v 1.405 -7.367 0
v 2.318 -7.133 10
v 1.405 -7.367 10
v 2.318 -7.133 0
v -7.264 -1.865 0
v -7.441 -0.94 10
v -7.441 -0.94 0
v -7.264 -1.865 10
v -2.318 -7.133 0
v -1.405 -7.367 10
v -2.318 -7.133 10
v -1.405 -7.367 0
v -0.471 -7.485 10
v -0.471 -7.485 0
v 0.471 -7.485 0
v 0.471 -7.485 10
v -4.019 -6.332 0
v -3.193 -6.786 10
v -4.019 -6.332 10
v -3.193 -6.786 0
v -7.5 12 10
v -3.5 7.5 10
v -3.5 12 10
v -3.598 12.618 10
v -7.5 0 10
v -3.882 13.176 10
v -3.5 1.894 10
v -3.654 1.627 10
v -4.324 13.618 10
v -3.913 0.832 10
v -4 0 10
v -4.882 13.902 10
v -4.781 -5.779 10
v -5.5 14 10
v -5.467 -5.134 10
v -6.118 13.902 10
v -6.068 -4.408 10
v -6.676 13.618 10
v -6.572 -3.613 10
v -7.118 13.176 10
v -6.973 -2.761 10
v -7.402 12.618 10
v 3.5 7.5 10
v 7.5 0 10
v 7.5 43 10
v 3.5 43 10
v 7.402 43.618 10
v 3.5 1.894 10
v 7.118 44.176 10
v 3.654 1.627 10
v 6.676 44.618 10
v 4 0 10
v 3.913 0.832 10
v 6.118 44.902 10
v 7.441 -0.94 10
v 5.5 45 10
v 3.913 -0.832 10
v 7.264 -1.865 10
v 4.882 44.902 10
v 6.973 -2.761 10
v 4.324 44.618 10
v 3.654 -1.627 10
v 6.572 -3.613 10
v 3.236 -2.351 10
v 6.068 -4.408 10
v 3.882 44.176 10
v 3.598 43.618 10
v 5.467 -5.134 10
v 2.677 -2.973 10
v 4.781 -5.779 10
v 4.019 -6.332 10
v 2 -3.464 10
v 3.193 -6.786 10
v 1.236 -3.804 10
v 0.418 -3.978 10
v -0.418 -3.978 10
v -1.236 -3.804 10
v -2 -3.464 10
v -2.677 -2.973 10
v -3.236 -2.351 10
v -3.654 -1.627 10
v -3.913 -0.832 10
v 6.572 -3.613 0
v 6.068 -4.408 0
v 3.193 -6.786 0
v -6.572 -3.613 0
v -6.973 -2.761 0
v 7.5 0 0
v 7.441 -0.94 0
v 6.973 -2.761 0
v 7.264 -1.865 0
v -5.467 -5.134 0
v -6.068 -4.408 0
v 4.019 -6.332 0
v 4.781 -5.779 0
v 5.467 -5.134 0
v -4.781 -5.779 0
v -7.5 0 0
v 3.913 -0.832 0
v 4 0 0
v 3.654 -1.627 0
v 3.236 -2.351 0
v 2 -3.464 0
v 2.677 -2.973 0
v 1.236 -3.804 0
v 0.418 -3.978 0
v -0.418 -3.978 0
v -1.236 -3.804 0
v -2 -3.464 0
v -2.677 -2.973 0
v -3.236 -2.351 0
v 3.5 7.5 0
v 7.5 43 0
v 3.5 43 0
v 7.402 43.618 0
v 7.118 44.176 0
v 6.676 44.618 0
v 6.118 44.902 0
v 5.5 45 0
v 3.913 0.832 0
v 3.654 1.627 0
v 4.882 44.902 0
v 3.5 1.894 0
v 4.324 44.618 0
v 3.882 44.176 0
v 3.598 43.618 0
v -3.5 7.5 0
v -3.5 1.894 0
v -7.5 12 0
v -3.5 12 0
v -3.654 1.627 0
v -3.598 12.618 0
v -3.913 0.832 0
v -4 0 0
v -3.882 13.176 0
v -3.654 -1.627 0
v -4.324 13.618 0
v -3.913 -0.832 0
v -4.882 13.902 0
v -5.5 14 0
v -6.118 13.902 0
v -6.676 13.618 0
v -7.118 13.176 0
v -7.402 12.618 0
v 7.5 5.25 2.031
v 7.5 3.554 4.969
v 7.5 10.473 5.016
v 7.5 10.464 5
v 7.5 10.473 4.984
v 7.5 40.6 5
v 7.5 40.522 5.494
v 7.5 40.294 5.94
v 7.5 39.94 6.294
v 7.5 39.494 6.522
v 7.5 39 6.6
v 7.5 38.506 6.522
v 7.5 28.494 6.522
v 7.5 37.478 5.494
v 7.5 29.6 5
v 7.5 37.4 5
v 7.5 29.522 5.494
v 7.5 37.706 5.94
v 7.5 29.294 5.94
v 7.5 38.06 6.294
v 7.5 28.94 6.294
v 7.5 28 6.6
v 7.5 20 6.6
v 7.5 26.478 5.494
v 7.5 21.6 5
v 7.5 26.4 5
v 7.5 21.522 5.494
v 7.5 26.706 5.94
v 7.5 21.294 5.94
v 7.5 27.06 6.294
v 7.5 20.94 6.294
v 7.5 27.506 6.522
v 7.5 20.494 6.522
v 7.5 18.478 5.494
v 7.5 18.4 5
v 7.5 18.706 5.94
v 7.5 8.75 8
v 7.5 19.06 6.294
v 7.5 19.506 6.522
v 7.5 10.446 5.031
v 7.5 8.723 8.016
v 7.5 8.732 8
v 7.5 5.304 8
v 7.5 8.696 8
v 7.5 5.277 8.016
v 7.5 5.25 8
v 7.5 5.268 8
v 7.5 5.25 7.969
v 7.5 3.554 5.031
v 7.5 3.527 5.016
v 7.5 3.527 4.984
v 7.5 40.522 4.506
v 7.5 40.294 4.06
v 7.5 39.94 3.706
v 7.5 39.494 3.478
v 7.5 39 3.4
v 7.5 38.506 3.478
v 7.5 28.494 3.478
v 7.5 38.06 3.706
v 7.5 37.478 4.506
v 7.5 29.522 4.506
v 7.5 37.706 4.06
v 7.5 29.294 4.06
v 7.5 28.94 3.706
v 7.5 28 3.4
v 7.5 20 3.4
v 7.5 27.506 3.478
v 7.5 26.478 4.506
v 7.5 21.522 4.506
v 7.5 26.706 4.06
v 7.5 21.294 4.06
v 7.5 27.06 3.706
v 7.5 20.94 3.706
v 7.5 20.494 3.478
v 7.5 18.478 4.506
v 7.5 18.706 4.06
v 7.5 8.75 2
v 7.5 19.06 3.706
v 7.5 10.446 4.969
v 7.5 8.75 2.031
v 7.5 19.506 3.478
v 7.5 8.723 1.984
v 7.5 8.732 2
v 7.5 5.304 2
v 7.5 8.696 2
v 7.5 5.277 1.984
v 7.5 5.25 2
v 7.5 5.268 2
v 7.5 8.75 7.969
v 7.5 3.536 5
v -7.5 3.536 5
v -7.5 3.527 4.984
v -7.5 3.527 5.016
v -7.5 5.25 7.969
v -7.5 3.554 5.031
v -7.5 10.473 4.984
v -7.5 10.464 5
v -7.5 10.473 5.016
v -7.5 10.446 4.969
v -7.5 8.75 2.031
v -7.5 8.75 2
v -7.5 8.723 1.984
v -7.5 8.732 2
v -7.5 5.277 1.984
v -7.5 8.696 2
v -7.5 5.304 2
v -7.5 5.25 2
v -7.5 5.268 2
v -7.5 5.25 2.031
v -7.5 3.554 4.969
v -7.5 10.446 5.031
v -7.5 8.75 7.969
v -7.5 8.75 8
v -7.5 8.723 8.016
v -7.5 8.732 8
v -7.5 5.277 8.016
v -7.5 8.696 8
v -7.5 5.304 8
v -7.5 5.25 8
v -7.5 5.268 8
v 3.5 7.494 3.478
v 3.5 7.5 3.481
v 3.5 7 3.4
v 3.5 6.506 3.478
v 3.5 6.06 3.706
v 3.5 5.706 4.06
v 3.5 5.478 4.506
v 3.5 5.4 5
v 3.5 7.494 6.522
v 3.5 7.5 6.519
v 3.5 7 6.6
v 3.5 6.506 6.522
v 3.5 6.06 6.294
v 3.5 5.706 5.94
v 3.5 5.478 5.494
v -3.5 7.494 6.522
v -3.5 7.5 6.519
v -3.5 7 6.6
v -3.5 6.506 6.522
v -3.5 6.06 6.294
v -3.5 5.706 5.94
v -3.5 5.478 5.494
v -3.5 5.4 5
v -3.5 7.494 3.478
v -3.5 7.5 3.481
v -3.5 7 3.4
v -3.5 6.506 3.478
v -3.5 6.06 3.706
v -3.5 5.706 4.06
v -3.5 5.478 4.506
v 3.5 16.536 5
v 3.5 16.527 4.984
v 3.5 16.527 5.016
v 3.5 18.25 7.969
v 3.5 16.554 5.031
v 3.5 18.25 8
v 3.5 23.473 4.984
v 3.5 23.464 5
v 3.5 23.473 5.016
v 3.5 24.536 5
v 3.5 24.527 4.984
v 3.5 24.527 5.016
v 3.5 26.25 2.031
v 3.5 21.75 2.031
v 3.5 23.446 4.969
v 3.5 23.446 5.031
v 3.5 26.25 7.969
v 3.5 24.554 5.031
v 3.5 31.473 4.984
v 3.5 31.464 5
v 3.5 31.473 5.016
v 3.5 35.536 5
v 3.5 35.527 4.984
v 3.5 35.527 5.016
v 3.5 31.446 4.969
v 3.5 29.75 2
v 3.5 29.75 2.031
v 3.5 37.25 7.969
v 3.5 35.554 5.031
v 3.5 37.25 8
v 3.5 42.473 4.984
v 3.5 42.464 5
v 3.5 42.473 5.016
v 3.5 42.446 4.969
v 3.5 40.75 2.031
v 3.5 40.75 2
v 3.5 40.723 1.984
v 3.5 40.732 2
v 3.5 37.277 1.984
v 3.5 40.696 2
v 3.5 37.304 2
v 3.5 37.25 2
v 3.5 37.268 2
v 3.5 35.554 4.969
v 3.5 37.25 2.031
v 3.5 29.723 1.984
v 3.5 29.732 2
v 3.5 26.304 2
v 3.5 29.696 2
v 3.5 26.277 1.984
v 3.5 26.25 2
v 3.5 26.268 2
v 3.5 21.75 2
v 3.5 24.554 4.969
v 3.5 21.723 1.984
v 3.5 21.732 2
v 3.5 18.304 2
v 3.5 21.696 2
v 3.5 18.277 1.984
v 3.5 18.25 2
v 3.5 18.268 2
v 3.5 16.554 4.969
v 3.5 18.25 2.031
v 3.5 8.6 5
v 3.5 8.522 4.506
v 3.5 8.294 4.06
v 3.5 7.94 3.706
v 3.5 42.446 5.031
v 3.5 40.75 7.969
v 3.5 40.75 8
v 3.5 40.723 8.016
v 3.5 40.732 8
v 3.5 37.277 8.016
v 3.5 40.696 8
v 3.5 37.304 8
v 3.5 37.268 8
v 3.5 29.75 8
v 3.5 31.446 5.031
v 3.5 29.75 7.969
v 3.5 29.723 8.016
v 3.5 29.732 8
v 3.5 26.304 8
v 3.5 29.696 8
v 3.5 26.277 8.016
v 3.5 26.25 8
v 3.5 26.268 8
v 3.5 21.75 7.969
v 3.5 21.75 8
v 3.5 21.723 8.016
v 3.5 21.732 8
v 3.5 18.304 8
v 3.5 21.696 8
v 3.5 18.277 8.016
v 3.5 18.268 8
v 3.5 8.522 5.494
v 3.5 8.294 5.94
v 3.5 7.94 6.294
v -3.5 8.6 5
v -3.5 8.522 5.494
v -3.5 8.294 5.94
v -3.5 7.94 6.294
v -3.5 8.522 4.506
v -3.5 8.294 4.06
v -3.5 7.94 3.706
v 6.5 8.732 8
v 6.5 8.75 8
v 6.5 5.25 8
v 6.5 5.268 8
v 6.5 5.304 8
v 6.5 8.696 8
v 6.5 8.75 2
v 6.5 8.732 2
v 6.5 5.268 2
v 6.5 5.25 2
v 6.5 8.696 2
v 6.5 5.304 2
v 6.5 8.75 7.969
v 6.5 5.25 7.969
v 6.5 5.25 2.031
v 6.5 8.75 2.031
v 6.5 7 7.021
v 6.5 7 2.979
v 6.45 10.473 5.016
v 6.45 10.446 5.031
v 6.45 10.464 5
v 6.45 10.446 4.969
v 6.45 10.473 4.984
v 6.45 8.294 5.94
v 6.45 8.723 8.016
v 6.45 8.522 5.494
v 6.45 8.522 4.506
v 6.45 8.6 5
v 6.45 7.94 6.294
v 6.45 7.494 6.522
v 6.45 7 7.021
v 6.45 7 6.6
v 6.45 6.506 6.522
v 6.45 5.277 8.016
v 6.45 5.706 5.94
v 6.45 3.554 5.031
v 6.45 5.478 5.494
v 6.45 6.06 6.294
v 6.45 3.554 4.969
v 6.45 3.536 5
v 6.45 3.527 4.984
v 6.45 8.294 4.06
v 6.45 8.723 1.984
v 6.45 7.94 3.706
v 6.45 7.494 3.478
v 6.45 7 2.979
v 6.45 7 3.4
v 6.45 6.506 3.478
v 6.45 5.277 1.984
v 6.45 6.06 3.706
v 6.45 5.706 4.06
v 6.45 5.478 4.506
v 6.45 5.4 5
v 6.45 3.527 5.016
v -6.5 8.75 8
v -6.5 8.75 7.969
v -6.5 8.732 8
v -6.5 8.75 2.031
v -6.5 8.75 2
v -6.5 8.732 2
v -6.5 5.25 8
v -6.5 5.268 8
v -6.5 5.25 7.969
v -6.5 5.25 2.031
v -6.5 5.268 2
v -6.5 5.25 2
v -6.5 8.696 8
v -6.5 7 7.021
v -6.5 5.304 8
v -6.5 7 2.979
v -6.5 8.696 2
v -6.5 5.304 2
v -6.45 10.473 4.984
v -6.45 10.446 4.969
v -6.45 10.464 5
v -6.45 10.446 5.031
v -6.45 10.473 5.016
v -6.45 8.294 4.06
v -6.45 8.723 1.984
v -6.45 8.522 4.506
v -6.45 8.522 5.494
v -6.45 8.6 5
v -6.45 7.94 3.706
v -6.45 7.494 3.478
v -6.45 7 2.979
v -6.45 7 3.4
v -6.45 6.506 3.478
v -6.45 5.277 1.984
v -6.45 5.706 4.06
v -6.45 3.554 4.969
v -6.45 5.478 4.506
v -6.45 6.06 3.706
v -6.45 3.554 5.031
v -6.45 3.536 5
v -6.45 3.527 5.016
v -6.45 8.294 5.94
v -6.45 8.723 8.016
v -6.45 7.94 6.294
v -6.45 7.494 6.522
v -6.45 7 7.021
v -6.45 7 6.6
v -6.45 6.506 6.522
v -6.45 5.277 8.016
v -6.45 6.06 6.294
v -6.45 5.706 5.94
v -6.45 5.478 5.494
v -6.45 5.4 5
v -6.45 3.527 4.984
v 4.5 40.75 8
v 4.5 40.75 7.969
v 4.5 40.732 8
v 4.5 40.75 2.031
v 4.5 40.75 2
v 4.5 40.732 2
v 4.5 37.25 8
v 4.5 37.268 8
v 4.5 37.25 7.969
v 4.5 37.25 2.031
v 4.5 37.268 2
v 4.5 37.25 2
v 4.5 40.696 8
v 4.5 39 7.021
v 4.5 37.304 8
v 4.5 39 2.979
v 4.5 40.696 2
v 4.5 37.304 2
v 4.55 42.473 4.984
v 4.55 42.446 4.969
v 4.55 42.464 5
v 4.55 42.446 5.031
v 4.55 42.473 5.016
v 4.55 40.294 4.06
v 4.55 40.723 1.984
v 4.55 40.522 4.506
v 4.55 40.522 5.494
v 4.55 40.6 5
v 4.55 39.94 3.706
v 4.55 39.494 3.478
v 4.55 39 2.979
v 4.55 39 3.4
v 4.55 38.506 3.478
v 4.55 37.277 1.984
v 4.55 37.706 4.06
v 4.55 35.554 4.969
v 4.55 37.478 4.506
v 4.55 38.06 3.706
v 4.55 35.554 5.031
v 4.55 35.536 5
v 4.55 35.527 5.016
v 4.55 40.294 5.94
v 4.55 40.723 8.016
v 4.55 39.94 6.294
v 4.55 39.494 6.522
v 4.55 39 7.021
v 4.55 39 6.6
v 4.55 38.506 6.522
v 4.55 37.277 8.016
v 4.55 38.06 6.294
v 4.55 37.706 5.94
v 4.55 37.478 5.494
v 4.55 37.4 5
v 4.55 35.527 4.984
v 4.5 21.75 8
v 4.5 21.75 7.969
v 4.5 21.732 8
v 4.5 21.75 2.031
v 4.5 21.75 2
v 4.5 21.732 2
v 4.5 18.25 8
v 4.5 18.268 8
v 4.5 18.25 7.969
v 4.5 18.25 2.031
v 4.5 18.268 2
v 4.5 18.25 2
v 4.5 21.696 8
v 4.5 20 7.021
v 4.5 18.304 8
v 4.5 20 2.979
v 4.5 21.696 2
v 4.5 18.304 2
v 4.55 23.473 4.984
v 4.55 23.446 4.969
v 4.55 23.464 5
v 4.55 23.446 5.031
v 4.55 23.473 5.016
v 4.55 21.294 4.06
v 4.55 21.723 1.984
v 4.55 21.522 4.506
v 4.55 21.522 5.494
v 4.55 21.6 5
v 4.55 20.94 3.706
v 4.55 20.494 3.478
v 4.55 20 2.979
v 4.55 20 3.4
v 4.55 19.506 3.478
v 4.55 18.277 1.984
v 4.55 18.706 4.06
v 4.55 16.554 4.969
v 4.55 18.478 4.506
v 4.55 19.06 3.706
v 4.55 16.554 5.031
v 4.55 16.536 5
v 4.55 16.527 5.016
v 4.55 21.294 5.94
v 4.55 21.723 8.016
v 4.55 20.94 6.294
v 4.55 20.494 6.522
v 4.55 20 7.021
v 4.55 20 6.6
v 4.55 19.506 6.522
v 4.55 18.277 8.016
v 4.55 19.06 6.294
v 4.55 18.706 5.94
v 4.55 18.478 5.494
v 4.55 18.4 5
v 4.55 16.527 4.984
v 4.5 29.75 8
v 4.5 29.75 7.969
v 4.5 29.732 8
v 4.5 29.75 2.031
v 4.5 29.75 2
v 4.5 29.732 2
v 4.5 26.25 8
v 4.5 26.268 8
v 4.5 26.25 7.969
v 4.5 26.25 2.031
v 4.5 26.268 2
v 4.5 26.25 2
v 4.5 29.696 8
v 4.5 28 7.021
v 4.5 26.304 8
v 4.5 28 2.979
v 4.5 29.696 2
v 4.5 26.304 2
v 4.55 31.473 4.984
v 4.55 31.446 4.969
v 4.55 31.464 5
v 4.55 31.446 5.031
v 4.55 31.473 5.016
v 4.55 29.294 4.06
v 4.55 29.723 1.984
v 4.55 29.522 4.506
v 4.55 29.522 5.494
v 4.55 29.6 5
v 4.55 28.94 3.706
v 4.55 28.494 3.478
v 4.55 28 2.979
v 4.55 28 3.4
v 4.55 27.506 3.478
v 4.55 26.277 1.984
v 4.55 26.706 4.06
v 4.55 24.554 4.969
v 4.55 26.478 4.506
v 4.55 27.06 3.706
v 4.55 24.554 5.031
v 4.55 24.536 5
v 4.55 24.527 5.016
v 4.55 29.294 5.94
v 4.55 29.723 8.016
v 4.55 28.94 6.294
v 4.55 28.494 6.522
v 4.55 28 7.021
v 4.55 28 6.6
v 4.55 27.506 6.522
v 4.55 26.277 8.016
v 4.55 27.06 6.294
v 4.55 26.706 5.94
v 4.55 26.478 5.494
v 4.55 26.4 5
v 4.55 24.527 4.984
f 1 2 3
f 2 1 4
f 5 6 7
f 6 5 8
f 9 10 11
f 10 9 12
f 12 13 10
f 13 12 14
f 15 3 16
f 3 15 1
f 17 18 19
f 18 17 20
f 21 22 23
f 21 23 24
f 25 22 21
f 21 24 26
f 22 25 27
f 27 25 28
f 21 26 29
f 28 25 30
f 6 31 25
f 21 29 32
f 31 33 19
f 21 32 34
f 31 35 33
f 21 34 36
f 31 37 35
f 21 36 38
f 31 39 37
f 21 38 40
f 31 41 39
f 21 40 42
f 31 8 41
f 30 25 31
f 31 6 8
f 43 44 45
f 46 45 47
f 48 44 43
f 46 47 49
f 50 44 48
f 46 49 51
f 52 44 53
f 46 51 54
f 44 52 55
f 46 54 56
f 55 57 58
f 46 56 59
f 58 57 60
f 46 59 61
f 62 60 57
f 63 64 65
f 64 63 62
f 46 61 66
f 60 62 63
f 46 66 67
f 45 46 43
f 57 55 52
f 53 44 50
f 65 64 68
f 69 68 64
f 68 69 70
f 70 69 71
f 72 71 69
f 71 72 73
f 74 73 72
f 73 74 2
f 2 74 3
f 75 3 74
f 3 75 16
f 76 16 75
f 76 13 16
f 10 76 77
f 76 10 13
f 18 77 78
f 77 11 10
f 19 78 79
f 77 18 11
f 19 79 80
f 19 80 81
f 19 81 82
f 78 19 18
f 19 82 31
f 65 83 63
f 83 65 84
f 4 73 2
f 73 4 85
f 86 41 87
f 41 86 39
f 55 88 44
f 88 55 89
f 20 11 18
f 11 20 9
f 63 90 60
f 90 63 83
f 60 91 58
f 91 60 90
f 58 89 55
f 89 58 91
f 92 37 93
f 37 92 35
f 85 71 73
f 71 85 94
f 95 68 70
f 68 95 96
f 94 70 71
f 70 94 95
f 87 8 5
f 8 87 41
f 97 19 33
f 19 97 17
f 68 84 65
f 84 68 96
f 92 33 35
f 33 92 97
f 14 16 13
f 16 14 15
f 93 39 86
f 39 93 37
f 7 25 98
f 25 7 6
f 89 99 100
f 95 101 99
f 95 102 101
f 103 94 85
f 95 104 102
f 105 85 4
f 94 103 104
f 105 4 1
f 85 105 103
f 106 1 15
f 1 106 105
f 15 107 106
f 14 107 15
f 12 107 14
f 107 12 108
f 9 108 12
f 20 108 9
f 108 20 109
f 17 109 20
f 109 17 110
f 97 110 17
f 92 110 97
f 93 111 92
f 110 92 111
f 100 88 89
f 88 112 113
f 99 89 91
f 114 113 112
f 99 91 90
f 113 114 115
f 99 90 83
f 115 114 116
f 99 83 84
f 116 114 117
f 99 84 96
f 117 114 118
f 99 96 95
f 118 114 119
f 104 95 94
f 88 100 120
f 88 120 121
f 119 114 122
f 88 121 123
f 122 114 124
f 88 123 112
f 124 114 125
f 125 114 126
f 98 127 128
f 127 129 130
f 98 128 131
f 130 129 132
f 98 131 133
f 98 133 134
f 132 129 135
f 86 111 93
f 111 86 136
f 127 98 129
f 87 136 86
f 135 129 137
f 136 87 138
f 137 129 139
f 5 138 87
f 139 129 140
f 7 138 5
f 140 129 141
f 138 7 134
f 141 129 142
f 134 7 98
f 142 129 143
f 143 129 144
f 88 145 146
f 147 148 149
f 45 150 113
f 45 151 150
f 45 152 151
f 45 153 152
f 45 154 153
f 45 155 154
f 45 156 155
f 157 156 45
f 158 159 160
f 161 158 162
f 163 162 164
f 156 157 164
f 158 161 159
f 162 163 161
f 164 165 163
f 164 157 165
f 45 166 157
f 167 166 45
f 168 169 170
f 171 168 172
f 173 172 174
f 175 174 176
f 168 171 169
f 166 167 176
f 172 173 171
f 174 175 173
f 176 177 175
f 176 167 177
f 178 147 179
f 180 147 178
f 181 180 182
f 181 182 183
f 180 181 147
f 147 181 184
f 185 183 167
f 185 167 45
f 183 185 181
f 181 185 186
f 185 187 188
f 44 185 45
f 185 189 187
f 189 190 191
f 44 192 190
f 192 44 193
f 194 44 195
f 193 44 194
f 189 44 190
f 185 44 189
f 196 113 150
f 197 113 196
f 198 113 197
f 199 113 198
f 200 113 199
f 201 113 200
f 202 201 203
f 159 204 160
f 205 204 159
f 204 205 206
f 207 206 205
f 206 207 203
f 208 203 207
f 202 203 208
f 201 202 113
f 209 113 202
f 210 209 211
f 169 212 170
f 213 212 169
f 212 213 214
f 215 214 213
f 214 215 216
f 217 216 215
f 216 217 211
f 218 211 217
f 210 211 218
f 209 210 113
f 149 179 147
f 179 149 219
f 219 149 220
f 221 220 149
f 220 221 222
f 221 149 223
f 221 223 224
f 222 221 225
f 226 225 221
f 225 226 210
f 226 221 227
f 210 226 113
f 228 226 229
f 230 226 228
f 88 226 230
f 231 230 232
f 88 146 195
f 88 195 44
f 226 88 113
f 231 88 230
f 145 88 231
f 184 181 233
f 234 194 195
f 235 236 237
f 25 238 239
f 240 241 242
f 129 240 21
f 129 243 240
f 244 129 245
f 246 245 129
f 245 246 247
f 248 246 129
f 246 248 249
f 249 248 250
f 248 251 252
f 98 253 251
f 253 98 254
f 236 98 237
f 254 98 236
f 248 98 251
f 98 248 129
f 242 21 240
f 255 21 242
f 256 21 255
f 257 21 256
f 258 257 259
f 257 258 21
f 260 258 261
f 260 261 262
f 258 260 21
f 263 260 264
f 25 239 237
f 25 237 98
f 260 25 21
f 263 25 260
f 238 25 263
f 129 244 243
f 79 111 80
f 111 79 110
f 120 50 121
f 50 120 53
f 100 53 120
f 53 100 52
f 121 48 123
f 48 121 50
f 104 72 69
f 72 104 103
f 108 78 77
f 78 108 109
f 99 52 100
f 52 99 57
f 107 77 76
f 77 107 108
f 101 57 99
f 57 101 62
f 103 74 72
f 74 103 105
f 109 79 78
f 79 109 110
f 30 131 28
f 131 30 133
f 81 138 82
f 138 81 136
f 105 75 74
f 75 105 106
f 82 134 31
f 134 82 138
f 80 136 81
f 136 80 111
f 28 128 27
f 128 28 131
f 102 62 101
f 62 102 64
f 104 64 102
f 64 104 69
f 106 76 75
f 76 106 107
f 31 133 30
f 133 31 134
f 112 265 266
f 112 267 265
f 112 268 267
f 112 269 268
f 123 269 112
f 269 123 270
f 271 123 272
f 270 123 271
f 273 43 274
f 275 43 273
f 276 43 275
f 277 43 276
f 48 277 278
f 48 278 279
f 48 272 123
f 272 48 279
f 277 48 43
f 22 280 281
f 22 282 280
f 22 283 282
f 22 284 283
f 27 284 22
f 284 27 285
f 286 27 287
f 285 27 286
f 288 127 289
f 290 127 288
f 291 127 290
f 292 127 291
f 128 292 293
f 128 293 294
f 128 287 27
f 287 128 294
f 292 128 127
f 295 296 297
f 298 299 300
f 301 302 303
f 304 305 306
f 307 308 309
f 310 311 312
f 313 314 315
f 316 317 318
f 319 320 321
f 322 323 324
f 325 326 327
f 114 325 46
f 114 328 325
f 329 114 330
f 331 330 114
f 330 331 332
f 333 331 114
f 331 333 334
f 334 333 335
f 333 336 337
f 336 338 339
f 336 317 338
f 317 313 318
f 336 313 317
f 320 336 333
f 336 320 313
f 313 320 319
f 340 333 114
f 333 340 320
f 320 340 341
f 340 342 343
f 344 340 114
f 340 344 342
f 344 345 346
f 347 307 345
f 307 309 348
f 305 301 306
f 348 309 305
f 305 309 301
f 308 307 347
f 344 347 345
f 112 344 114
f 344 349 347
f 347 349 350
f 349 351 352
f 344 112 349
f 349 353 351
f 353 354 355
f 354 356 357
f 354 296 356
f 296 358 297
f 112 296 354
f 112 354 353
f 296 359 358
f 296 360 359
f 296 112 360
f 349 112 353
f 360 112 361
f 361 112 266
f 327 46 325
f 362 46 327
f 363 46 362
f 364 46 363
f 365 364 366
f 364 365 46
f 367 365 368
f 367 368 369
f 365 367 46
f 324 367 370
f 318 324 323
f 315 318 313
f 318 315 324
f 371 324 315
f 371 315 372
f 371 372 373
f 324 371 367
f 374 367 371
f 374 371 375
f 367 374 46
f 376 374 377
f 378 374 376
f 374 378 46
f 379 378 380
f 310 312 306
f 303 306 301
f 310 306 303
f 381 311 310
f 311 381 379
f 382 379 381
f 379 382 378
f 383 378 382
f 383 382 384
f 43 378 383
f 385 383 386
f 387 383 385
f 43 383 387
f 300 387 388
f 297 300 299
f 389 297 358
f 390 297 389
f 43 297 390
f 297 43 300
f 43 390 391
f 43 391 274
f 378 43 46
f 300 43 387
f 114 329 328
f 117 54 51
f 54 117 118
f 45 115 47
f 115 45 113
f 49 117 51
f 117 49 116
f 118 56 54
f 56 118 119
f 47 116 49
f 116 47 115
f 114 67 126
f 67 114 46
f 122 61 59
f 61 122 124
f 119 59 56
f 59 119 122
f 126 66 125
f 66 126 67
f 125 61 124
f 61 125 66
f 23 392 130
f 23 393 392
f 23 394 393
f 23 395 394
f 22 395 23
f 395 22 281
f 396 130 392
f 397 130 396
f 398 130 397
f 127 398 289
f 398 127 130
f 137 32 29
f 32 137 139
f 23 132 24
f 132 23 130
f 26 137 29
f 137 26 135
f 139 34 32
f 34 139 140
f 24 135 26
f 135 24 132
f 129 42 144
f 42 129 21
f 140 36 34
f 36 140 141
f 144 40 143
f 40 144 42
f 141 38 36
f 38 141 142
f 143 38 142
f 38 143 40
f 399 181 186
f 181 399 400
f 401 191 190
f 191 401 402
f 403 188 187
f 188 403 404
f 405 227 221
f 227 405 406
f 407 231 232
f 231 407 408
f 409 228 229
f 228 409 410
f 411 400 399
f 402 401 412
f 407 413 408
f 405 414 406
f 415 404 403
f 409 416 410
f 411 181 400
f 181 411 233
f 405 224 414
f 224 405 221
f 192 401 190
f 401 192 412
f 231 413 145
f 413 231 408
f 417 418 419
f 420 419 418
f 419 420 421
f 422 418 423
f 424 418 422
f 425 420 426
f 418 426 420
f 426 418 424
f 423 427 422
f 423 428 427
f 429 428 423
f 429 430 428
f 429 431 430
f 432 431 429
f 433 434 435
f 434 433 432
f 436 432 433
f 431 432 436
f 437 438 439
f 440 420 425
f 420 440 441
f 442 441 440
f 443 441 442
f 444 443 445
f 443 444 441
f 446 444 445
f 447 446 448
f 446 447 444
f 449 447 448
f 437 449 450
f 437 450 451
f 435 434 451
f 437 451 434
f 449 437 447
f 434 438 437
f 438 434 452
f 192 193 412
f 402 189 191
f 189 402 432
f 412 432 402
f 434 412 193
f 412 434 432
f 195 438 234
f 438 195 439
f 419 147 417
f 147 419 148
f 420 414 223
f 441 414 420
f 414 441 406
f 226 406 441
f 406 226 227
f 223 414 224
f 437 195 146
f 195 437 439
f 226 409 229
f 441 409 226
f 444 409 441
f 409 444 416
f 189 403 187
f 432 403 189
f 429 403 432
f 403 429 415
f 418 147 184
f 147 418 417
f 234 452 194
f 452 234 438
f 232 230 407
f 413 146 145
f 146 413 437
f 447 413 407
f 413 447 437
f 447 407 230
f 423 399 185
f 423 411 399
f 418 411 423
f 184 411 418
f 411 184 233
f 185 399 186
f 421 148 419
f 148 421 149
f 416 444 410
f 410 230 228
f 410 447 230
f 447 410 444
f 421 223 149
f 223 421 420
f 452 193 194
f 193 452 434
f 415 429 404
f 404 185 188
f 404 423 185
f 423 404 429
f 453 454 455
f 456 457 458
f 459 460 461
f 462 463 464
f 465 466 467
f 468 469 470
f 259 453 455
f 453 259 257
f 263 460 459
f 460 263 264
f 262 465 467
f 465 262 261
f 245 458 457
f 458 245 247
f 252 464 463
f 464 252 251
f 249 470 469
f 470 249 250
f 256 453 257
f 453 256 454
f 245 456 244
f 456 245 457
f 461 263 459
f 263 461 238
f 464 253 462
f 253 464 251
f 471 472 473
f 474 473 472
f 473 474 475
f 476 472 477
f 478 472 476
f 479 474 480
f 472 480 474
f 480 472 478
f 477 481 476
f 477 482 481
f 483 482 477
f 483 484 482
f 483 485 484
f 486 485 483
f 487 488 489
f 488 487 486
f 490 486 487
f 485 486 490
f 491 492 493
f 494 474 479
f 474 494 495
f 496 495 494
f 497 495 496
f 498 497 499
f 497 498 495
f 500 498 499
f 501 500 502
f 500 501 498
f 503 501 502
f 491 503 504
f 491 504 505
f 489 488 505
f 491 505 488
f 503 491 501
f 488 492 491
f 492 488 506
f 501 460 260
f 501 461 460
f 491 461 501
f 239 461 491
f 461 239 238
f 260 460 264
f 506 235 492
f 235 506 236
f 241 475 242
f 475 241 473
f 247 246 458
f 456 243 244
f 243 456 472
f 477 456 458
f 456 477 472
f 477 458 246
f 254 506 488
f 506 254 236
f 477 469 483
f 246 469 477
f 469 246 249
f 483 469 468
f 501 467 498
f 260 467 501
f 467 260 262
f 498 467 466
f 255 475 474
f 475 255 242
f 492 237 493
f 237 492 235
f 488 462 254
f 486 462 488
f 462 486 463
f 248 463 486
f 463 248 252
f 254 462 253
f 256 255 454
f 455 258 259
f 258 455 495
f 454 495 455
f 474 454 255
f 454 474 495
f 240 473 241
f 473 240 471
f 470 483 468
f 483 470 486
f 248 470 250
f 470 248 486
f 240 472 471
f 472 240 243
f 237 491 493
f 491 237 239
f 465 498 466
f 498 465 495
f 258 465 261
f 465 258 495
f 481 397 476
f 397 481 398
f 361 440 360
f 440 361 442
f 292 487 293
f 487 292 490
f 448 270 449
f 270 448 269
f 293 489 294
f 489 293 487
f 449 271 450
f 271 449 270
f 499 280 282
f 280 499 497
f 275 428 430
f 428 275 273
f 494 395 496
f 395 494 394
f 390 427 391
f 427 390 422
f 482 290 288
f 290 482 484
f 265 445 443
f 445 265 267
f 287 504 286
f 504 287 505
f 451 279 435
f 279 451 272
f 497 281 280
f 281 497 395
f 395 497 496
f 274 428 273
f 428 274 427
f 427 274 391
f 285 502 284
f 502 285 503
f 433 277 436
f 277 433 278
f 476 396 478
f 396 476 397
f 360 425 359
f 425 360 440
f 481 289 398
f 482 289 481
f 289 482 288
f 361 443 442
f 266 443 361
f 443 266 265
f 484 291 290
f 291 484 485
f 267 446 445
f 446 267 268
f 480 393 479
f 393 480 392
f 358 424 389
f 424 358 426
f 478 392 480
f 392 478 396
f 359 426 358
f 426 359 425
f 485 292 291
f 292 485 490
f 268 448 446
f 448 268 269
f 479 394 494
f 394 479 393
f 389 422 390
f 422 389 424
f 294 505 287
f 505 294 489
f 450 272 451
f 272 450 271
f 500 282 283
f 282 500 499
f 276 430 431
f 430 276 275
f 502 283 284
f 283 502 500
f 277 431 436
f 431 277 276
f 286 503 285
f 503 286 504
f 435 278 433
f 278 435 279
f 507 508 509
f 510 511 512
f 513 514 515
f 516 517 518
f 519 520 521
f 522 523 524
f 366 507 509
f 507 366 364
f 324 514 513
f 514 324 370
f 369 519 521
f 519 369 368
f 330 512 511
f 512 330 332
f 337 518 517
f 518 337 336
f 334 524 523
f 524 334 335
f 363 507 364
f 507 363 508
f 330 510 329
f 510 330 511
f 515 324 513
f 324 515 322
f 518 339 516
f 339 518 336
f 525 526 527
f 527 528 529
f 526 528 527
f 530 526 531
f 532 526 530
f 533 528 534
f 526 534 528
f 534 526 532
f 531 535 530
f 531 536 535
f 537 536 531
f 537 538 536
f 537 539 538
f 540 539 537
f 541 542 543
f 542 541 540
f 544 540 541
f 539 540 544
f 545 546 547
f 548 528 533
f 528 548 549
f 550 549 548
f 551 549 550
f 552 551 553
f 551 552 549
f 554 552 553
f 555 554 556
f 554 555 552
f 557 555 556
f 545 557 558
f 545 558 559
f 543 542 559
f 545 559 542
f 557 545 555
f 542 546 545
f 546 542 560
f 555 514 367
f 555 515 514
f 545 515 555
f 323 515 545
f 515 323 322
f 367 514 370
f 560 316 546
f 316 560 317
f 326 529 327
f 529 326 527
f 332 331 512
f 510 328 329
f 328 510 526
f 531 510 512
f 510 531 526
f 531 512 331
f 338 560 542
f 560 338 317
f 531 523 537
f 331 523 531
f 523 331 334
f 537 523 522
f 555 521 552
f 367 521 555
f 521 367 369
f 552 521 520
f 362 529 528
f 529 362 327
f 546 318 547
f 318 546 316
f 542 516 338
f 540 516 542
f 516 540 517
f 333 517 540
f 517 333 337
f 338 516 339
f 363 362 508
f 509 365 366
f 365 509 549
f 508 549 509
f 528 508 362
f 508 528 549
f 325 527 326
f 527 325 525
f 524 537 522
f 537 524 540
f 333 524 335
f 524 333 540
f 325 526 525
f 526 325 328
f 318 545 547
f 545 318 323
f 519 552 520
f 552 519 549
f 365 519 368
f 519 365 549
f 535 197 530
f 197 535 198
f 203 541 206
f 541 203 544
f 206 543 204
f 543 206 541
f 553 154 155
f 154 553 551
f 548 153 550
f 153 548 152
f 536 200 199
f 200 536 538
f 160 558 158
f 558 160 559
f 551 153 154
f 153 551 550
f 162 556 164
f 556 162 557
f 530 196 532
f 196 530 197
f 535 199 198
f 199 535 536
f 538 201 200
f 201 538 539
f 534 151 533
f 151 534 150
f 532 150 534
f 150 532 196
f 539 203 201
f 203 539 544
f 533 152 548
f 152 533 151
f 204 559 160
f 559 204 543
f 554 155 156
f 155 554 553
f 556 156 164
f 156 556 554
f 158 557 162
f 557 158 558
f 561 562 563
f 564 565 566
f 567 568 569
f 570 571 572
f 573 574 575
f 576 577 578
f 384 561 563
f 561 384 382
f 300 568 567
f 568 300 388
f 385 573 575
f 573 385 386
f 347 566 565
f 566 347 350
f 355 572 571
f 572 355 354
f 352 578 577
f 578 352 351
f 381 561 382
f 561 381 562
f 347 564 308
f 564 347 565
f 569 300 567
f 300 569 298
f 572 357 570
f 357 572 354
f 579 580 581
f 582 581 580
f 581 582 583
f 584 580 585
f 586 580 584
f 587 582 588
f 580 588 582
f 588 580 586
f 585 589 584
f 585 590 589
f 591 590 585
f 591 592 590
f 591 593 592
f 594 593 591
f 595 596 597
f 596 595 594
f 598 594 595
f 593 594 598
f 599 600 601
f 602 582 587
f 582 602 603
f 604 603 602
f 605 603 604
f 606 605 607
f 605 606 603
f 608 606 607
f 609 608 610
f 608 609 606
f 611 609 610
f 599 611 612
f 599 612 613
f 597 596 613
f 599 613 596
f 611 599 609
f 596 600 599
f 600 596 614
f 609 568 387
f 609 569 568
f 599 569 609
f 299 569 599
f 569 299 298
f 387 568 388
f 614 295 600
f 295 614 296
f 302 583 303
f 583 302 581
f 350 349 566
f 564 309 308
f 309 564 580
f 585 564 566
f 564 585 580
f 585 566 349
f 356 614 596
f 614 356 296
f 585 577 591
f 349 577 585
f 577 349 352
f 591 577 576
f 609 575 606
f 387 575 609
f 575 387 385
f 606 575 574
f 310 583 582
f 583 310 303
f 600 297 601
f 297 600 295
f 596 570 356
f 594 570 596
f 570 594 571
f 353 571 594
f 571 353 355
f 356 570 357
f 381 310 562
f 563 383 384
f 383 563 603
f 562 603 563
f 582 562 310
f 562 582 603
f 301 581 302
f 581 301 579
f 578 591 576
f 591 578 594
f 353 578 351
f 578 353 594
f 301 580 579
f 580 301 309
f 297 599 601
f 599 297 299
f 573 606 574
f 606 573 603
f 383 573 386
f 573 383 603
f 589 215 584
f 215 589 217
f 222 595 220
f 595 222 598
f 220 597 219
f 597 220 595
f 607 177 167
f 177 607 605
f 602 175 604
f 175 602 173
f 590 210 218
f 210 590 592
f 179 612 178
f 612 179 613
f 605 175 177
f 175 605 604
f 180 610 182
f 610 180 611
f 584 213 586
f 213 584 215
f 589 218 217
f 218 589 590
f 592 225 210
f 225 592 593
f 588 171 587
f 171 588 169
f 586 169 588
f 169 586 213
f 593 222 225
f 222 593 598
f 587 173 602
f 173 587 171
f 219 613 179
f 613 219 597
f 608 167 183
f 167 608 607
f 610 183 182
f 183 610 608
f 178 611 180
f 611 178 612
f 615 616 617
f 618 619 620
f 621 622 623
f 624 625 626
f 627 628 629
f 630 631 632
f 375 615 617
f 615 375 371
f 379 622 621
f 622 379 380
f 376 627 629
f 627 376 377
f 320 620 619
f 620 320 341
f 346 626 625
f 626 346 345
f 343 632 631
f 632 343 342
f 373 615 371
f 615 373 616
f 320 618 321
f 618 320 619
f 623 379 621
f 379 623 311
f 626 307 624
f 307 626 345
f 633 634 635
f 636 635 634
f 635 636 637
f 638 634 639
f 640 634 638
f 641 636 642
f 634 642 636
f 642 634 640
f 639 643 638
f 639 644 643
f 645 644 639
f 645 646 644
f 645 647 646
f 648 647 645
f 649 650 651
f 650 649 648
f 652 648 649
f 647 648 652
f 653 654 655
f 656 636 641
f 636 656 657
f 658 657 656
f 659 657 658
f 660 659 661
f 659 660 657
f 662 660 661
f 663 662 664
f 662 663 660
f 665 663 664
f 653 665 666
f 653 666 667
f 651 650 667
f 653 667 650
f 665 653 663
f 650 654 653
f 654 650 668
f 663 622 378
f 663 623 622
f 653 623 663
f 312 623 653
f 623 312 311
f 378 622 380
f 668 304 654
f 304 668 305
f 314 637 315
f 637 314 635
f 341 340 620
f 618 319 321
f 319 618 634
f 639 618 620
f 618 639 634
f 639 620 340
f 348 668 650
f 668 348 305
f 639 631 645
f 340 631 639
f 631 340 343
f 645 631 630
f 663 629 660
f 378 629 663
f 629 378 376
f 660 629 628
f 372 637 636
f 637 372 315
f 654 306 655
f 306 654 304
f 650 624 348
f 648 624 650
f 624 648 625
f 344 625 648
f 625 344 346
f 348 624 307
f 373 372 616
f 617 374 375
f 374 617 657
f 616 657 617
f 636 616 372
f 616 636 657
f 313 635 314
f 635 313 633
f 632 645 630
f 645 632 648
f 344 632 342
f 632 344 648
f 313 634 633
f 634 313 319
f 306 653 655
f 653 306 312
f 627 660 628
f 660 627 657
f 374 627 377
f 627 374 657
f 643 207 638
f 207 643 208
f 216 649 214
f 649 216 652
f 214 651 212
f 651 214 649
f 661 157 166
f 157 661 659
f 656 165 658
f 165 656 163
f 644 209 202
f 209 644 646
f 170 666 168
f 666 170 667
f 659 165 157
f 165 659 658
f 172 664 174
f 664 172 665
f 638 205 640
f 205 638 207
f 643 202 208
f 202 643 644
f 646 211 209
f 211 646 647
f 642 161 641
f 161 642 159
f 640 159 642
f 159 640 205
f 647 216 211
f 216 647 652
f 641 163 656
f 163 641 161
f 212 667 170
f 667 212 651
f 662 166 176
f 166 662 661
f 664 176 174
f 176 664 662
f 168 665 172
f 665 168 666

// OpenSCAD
rodDiameter = 8;
mainWall = 4;
height = 10;
endstopSpacing = 19;
endstopSpacing2 = 11;

module mainCurve(rod = 8, wall = 4, h = 10) {
	extra = 0.5;
	curveWall = wall - extra;
	innerRad = rod/2;
	outerRad = (innerRad + curveWall);
	difference() {
		union() {
			cylinder(h=h, r = outerRad, $fn=50);
			translate([-outerRad,0,0]) cube([2*outerRad,outerRad,h]);
		}
		translate([0,0,-0.1]) cylinder(h=(h+0.2), r = innerRad, $fn=30);
		translate([-innerRad+extra, 0, -0.1]) cube([rod-2*extra, outerRad+0.1, (h+0.2)]);
	}
}

module leg(length = 32, thickness = 4, h = 10) {
	wallThickness = thickness - 0.5;
	cube([thickness, length, h]);
	translate([thickness/2, length, 0]) cylinder(h=h, r=(thickness/2), $fn=20);
}

module m3withTolerance(length = 30) {
	union() {
		cube([2,3.5,6], center=true);
		rotate([60,0,0]) cube([2.1,3.5,6], center=true);
		rotate([120,0,0]) cube([2.1,3.5,6], center=true);
//		rotate([0, 90, 180]) cylinder(h = length + 0.1, r = 1.6, $fn= 20);
		rotate([0, 90, 0])cylinder(h = length + 0.1, r = 1.6, $fn= 20);
	}
}

module mainBody(wall = 4, rod = 8, h = 10) {
	wallThickness = wall - 0.5;
	innerRadius = rod/2;
	outerRadius = (innerRadius + wallThickness);
	shortLeg = rod/2 + 8;
	longLeg = shortLeg + 12 + endstopSpacing;
	
	difference() {
		//the body of the holder
		union() {
			mainCurve(rod, wall, h);
			
			translate([outerRadius - wall, outerRadius,0]) 
				leg(longLeg - outerRadius, wall, h);
			
			translate([-outerRadius,outerRadius,0])
				leg(shortLeg - outerRadius, wall, h);
		}
		//holes for m3 screws with spaces for nuts
		color([1,0,0]) {
//			translate([outerRadius,shortLeg - 5,height - 5])
//				m3withTolerance(outerRadius*2);
//
//			translate([outerRadius,shortLeg - 5,height - 5])
//		union() {
//		cube([2,3.5,6], center=true);
//		rotate([60,0,0]) cube([2.1,3.5,6], center=true);
//		rotate([120,0,0]) cube([2.1,3.5,6], center=true);
//		rotate([0, 90, 180]) cylinder(h = 30 + 0.1, r = 1.6, $fn= 20);}
			translate([outerRadius,shortLeg - 5,height - 5])
				m3withTolerance(outerRadius*2);
			translate([outerRadius - mainWall*2 + 1 - rodDiameter,shortLeg - 5,height - 5])
				m3withTolerance(outerRadius*2);
		
//			translate([outerRadius,longLeg - 4,height - 5])
//				m3withTolerance(outerRadius*2);
//			translate([outerRadius,longLeg - 4 - endstopSpacing,height - 5])
//				m3withTolerance(outerRadius*2);
//			translate([outerRadius,longLeg - 4 - endstopSpacing2,height - 5])
//				m3withTolerance(outerRadius*2);

			translate([innerRadius - 0.5,longLeg - 4,height - 5])
				m3withTolerance(outerRadius*2);
			translate([innerRadius - 0.5,longLeg - 4 - endstopSpacing,height - 5])
				m3withTolerance(outerRadius*2);
			translate([innerRadius - 0.5,longLeg - 4 - endstopSpacing2,height - 5])
				m3withTolerance(outerRadius*2);
		}
	}
}

mainBody(mainWall, rodDiameter, height);
